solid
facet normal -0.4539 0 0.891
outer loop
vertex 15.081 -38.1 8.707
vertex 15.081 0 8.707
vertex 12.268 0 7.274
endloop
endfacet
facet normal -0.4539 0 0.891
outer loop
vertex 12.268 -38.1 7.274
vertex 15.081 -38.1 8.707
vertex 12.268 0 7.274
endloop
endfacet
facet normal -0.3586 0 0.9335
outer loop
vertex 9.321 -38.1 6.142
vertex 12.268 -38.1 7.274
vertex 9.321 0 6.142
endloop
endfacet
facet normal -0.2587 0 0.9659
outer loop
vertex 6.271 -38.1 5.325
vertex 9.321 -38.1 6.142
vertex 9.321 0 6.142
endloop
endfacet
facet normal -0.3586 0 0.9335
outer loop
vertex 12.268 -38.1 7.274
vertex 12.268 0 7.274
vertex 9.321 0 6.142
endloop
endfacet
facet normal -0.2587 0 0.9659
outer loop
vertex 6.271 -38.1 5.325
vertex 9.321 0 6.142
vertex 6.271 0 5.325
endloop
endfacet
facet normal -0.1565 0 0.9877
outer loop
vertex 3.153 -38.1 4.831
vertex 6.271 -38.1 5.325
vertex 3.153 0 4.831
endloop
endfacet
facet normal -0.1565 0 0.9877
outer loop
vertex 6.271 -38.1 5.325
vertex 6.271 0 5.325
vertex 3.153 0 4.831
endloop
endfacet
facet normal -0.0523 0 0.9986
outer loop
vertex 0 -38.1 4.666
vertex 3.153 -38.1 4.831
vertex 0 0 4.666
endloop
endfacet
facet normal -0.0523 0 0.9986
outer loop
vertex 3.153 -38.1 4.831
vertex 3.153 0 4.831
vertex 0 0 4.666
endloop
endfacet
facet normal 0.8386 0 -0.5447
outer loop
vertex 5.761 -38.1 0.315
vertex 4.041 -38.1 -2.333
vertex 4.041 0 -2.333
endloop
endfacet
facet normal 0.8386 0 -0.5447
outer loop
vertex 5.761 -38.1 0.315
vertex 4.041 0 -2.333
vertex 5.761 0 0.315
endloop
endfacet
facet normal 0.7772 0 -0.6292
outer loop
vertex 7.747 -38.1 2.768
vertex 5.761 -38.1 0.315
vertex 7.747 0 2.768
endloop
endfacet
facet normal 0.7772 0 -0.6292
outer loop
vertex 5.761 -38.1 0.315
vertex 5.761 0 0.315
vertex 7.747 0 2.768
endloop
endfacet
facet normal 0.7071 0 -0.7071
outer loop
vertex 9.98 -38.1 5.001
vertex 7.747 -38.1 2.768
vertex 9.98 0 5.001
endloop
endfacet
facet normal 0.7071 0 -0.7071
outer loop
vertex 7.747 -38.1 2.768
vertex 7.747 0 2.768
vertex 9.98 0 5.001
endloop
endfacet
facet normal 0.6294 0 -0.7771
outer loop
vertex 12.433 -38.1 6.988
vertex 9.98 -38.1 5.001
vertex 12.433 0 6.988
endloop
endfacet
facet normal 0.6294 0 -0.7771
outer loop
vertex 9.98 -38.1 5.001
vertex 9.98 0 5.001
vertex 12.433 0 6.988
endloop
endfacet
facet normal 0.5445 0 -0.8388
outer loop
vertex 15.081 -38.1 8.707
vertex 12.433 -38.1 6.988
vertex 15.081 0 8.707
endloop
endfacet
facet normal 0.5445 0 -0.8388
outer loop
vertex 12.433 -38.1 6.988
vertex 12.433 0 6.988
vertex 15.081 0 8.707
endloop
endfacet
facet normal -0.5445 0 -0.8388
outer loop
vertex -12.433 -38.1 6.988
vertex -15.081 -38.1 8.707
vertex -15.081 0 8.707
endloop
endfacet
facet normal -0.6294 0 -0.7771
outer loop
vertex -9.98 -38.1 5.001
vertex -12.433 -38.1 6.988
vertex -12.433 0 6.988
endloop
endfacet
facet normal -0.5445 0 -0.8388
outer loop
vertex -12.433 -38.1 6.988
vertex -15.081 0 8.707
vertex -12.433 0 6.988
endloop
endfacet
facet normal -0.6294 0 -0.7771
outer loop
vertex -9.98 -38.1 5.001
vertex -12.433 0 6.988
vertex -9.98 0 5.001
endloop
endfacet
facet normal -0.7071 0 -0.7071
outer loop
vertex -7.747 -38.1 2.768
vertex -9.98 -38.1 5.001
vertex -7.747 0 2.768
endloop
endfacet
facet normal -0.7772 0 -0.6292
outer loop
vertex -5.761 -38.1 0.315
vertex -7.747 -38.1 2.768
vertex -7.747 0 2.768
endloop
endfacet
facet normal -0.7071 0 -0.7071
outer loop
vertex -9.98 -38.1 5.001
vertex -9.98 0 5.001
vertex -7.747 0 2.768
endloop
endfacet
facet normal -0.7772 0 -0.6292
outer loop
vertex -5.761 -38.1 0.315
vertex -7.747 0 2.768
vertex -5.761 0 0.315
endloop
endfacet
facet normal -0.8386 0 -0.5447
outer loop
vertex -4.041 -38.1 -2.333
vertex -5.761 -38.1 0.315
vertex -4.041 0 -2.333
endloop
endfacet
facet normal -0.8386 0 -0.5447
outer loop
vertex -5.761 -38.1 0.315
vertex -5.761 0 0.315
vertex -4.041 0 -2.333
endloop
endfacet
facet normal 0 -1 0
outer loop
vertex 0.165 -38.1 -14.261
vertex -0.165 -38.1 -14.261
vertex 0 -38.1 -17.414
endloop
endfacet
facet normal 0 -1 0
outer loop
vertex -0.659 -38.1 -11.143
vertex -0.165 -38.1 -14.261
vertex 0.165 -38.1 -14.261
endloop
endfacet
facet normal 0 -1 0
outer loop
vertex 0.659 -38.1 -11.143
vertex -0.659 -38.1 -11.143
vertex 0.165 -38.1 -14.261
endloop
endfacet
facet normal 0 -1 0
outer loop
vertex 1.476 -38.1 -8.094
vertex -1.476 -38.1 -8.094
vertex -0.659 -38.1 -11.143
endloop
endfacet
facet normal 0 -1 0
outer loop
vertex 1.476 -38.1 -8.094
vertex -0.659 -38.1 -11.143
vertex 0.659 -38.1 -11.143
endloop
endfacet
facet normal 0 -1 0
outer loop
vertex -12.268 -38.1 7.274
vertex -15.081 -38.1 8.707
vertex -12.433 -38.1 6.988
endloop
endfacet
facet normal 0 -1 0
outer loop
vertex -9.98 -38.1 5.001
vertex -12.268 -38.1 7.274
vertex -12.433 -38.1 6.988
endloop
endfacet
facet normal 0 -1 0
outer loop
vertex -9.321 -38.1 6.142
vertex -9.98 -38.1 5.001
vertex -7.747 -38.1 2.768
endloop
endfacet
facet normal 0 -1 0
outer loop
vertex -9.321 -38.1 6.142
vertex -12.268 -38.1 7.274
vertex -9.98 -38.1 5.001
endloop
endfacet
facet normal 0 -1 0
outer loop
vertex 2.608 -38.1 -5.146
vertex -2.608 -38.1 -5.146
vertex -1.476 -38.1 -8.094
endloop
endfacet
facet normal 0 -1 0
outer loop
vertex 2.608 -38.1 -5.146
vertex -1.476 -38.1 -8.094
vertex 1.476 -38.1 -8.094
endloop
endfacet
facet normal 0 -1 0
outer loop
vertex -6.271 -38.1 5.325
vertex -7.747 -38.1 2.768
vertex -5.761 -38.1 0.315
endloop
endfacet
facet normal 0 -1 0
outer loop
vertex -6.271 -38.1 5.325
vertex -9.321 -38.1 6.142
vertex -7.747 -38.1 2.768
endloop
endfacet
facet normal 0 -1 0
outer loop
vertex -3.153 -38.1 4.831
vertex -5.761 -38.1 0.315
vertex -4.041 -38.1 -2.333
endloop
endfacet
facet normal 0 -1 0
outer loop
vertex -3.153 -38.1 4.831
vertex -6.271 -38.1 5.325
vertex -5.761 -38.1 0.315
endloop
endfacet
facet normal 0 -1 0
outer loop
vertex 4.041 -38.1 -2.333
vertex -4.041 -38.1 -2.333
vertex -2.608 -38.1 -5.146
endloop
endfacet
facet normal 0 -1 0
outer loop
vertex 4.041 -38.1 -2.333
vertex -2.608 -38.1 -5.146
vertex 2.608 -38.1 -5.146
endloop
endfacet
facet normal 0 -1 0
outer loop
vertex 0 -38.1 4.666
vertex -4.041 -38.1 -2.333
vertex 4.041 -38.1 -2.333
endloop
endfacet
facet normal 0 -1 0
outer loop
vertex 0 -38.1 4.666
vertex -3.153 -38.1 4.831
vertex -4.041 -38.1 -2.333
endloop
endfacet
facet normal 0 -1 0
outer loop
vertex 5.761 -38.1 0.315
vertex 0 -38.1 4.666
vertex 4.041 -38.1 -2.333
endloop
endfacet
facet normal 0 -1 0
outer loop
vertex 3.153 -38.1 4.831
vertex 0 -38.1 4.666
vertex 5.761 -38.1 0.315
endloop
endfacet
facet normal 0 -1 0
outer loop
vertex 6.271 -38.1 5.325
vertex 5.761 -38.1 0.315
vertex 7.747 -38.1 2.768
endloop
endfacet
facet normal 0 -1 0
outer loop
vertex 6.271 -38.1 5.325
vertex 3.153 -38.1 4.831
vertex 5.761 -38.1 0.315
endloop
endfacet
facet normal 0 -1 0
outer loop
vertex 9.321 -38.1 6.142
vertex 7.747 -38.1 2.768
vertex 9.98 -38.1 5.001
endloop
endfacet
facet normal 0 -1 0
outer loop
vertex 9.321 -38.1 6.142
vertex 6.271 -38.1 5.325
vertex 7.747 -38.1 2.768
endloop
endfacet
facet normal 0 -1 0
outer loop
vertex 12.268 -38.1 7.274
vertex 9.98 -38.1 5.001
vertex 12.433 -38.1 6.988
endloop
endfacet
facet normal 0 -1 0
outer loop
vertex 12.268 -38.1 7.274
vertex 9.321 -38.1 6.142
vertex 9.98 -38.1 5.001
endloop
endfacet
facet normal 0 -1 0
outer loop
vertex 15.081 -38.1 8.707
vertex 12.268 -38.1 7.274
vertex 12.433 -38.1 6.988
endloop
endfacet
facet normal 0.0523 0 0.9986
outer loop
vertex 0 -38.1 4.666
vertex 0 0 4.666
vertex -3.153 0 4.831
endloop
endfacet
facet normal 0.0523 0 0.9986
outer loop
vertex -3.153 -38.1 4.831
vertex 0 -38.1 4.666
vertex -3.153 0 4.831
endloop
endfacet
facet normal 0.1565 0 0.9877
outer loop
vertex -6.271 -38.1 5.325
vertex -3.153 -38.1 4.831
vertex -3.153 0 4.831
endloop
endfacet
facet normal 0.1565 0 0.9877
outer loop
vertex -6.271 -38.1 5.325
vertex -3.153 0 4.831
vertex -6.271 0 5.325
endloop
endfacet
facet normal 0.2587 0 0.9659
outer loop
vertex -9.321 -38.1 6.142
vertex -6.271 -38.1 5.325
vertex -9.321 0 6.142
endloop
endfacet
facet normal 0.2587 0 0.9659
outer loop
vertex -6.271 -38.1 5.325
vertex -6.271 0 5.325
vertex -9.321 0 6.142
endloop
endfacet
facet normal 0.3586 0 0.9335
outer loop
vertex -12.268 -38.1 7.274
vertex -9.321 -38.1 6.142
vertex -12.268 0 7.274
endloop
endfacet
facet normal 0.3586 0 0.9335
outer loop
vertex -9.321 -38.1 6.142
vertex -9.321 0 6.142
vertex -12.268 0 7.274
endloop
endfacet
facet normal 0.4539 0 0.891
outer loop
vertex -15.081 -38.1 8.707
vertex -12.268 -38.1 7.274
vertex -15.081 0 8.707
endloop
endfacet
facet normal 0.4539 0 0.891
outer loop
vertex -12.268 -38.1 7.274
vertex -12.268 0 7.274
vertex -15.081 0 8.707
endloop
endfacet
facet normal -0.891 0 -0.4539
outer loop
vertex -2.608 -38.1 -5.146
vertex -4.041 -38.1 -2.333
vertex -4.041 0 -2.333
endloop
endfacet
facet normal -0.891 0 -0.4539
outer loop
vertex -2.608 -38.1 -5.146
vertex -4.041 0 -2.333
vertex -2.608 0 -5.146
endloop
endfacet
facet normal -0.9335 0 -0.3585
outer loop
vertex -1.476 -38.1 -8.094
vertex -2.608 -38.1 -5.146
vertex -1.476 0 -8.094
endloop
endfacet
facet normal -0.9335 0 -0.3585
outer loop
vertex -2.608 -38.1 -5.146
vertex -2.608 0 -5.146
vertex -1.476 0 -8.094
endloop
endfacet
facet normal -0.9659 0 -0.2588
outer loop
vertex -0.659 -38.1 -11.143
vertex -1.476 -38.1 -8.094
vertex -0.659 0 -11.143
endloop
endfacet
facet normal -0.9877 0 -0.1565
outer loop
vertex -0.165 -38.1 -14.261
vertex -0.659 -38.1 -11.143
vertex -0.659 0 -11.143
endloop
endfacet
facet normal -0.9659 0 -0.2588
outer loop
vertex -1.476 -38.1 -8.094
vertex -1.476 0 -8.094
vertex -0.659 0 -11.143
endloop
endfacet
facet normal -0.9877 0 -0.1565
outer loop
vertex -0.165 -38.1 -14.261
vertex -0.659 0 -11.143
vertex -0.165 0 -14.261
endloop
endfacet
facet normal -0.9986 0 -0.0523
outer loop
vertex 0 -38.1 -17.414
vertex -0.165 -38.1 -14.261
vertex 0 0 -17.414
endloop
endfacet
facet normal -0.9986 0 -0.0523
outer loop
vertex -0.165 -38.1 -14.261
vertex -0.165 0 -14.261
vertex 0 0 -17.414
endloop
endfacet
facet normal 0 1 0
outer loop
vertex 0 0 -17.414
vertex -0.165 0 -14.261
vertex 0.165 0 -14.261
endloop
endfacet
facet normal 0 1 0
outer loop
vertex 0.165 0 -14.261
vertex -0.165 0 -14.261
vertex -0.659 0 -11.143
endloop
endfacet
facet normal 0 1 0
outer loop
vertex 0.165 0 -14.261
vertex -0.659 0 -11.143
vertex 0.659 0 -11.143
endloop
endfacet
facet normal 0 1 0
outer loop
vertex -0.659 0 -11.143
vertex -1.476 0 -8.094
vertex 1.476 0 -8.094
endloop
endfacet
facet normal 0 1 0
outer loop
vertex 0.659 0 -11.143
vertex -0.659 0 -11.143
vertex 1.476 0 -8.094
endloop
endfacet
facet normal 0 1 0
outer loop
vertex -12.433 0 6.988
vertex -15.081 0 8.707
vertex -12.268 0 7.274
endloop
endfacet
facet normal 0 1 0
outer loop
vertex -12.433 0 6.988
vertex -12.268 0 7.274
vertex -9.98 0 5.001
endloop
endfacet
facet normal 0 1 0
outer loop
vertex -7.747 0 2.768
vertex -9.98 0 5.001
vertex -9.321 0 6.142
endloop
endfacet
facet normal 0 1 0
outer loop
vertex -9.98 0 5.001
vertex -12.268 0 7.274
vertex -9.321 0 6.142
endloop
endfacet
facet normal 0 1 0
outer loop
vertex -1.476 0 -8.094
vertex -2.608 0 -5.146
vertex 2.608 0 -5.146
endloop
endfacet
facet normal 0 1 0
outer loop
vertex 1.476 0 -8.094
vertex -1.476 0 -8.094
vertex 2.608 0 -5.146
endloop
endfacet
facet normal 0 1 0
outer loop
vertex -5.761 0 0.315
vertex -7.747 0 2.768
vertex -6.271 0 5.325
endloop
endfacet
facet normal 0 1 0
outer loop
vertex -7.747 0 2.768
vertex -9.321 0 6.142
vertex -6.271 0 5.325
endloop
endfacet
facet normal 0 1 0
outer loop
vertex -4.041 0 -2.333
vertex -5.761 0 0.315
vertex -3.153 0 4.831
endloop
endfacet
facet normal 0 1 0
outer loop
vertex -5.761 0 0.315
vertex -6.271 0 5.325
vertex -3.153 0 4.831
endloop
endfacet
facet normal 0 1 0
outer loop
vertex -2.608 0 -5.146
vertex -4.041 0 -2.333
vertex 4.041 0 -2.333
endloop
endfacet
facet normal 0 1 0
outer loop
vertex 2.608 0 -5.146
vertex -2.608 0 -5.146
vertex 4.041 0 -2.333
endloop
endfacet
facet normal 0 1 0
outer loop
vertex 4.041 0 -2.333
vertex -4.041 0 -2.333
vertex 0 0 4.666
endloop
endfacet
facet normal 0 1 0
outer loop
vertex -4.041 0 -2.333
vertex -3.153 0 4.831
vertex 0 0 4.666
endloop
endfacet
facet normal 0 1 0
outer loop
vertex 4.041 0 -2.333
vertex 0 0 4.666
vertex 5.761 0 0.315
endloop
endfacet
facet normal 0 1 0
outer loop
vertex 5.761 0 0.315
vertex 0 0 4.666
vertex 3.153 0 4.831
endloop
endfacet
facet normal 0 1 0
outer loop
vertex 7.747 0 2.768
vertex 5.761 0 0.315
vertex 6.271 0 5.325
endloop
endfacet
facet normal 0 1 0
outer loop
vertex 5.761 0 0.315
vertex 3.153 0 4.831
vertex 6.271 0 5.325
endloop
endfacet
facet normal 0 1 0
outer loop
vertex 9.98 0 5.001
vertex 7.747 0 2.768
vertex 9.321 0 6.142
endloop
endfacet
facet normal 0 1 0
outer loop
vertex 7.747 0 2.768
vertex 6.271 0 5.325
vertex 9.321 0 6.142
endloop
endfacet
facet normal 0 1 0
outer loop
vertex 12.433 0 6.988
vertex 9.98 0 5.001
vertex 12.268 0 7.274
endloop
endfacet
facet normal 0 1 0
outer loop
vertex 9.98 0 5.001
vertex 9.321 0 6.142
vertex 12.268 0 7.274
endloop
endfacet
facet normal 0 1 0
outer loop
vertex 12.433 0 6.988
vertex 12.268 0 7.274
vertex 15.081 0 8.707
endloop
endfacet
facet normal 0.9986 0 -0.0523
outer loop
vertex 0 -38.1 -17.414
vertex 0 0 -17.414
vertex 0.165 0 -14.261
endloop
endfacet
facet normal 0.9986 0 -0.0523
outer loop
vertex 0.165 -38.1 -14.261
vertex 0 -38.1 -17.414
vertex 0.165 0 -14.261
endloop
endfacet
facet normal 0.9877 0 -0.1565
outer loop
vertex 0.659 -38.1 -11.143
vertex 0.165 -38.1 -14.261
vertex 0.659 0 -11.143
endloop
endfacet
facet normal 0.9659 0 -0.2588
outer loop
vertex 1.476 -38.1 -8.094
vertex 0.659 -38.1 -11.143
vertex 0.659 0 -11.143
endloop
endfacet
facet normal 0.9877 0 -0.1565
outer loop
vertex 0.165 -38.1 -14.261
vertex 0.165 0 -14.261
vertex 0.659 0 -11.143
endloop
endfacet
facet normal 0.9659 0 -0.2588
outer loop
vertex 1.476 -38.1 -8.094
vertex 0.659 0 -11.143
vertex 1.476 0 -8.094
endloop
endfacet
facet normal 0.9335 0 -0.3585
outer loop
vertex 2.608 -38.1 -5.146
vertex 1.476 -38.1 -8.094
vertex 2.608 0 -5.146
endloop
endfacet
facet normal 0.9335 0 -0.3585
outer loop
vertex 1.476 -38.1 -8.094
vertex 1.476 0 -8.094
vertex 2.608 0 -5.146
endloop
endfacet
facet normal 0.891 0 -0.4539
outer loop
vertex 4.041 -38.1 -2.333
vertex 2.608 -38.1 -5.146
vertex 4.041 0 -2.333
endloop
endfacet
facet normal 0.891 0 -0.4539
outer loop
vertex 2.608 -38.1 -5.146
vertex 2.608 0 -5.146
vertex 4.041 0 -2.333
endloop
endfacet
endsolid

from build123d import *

# Parameters (mm, degrees)
F1_DEPTH = 38.1


with BuildPart() as f1:
    # F0 (on Front) → F1 (new body)
    with BuildSketch(Plane.XZ):
        with BuildLine():
            Line((-4.0410087584, -2.3330774944), (0, 0))
            Line((0, 0), (0, 4.6661549889))
            ThreePointArc((0, 4.6661549889), (-7.8066293313, 5.6939172222), (-15.0812497909, 8.7071636265))
            ThreePointArc((-15.0812497909, 8.7071636265), (-8.8343916271, 3.9137807077), (-4.0410087584, -2.3330774944))
        make_face()
        with BuildLine():
            Line((0, 0), (4.0410087584, -2.3330774944))
            ThreePointArc((4.0410087584, -2.3330774944), (8.8343919533, 3.913781034), (15.0812505899, 8.7071640878))
            ThreePointArc((15.0812505899, 8.7071640878), (7.8066297769, 5.6939173416), (0, 4.6661549889))
            Line((0, 4.6661549889), (0, 0))
        make_face()
        with BuildLine():
            ThreePointArc((0, -17.4143274944), (1.0277622646, -9.6076980465), (4.0410087584, -2.3330774944))
            Line((4.0410087584, -2.3330774944), (0, 0))
            Line((0, 0), (-4.0410087584, -2.3330774944))
            ThreePointArc((-4.0410087584, -2.3330774944), (-1.0277622646, -9.6076980465), (0, -17.4143274944))
        make_face()
    extrude(amount=F1_DEPTH)


solid = f1.part
